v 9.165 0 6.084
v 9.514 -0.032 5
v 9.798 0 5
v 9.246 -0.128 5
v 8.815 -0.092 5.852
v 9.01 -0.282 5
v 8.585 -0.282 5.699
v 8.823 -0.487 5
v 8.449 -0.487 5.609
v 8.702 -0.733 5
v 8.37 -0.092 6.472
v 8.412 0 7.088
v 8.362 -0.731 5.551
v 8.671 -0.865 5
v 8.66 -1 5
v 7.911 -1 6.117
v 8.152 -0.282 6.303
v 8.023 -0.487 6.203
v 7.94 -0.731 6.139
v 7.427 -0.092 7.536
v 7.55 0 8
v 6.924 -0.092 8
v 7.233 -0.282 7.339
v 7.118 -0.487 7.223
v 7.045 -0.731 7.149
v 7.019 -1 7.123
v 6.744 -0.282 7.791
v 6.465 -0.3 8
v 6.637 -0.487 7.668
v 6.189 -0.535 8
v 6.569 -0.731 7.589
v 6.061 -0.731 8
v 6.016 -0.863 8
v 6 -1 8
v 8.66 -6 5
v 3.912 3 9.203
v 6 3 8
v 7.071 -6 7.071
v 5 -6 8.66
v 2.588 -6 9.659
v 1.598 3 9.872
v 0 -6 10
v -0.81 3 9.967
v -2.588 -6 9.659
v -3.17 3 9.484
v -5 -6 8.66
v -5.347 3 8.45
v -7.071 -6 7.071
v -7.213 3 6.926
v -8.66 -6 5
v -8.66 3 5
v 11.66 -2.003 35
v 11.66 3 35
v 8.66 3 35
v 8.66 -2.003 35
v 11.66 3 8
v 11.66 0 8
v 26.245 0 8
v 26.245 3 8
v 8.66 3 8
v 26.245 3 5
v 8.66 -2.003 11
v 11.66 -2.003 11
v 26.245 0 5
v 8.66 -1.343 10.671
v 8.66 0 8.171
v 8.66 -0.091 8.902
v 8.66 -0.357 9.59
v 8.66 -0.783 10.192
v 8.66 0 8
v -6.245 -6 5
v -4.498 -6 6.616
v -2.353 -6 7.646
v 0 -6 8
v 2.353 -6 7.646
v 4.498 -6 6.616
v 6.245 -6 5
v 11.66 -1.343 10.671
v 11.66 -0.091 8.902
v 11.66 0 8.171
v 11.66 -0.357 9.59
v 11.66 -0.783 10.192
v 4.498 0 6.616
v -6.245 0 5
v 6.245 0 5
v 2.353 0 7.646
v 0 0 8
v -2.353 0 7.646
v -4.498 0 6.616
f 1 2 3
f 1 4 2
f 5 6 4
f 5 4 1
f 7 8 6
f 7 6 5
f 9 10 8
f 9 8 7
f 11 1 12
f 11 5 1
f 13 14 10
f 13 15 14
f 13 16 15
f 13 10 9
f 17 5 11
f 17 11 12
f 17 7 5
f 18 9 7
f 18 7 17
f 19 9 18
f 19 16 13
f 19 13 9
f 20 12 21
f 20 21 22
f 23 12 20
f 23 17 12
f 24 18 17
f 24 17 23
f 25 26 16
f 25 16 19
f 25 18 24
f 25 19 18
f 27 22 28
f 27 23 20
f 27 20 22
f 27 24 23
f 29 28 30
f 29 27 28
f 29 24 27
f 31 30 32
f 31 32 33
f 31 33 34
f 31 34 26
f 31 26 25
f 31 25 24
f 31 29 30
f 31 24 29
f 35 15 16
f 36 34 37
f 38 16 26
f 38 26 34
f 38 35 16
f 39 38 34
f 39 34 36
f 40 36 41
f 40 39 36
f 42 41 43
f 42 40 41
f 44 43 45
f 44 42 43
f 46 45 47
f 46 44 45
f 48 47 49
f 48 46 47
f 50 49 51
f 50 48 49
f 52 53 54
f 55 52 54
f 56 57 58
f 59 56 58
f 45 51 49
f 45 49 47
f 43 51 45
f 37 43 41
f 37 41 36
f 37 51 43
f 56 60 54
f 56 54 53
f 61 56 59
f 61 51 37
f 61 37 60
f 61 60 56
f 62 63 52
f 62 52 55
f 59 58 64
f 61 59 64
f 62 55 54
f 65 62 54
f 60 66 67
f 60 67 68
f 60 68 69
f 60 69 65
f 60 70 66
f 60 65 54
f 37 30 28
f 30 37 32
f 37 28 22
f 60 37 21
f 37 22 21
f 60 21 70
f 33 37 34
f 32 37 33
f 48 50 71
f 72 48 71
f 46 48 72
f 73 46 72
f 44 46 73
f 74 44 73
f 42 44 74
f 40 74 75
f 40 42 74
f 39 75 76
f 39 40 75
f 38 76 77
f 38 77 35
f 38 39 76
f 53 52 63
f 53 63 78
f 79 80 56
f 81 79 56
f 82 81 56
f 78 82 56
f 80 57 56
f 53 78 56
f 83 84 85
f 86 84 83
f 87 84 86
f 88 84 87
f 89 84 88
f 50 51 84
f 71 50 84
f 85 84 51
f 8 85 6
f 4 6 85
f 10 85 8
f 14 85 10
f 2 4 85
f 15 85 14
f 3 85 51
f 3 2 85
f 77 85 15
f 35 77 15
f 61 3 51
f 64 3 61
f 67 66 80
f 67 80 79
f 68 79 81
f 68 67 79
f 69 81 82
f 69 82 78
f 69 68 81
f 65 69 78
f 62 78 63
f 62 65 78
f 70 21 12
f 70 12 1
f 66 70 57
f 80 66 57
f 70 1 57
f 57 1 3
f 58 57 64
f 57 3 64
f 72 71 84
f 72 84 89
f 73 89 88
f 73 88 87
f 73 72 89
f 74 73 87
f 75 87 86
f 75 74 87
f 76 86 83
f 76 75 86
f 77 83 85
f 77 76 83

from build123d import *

# Parameters (mm, degrees)
EXTRUDE_1_DEPTH = 3
EXTRUDE_START   = 6
EXTRUDE_2_DEPTH = 6
EXTRUDE_6_DEPTH = 30
FILLET_1_R      = 1
EXTRUDE_9_DEPTH = 24.000000000000007
FILLET_2_R      = 3


with BuildPart() as part:
    # 草图1 → 凸台-拉伸1 (new body)
    with BuildSketch(Plane(origin=(0, 0, 0), x_dir=(1, 0, 0), z_dir=(0, 1, 0))):
        with BuildLine():
            ThreePointArc((-8.660254037844387, -5.000000000000001), (-2.0048037027267505, -9.796977192661679), (5.999999999999981, -8.000000000000014))
            Line((5.999999999999978, -8), (26.244997998398397, -8))
            Line((26.244997998398397, -8), (26.244997998398397, -5))
            Line((26.244997998398397, -5), (-8.660254037844389, -5))
        make_face()
    extrude(amount=EXTRUDE_1_DEPTH)

    # 草图2 → 凸台-拉伸2 (add)
    with BuildSketch(Plane.XZ.offset(EXTRUDE_START)):
        with BuildLine():
            ThreePointArc((6.000000000000001, 7.999999999999999), (-2.0048037027267367, 9.796977192661682), (-8.660254037844386, 5.0000000000000036))
            Line((-8.660254037844387, 5), (-6.244997998398355, 5))
            ThreePointArc((-6.244997998398368, 5.000000000000037), (7.6e-15, 8), (6.244997998398378, 5.000000000000025))
            Line((6.24499799839837, 5), (8.660254037844625, 5))
            ThreePointArc((8.660254037844535, 4.999999999999743), (7.4820292777785, 6.63469953249319), (6.000000000000001, 7.999999999999999))
        make_face()
    extrude(amount=-EXTRUDE_2_DEPTH)

    # 草图3 → 凸台-拉伸6 (add)
    with BuildSketch(Plane(origin=(0, 0, 5), x_dir=(-1, 0, 0), z_dir=(0, 0, -1))):
        Polygon((-8.660254037844387, 0), (-8.660254037844387, 3.000000000000001), (-11.660254037844386, 3), (-11.660254037844384, 0), align=None)
    extrude(amount=-EXTRUDE_6_DEPTH)

    # 圆角1
    fillet_1_edges = [part.edges().sort_by_distance(p)[0] for p in [
        (7.4820292777784605, 0, 6.634699532493231),
    ]]
    fillet(fillet_1_edges, radius=FILLET_1_R)

    # 草图5 → 凸台-拉伸9 (add)
    with BuildSketch(Plane.XY.offset(34.99999999999999)):
        Polygon((8.660254037844387, -2.0027453895176524), (8.660254037844387, 0), (11.660254037844386, 0), (11.660254037844384, -2.002745389517652), align=None)
    extrude(amount=-EXTRUDE_9_DEPTH)

    # 圆角2
    # the kernel refuses this fillet: 3 mm, written as the material it adds along each edge
    with BuildSketch(Plane(origin=(8.660254037844387, 0, 10.999999999999986), x_dir=(0, -1, 0), z_dir=(1, 0, 0))) as fillet_2_piece_1:
        with BuildLine():
            CenterArc((3, 2.8293962680882476), FILLET_2_R, 180, 70.58438351191461)
            Line((0, 2.8293962680882476), (-0.06, 2.8293962680882476))
            Line((-0.06, 2.8293962680882476), (-0.06, 0))
            Line((-0.06, 0), (0, -0.0600000000000005))
            ThreePointArc((0, -0.0600000000000005), (1.0013726947588264, -0.0600000000000005), (1.9828002973080059, -0.05658792536176449))
            Line((1.9828002973080059, -0.05658792536176449), (2.002745389517653, 0))
        make_face()
    extrude(amount=2.9999999999999982)


solid = part.part
